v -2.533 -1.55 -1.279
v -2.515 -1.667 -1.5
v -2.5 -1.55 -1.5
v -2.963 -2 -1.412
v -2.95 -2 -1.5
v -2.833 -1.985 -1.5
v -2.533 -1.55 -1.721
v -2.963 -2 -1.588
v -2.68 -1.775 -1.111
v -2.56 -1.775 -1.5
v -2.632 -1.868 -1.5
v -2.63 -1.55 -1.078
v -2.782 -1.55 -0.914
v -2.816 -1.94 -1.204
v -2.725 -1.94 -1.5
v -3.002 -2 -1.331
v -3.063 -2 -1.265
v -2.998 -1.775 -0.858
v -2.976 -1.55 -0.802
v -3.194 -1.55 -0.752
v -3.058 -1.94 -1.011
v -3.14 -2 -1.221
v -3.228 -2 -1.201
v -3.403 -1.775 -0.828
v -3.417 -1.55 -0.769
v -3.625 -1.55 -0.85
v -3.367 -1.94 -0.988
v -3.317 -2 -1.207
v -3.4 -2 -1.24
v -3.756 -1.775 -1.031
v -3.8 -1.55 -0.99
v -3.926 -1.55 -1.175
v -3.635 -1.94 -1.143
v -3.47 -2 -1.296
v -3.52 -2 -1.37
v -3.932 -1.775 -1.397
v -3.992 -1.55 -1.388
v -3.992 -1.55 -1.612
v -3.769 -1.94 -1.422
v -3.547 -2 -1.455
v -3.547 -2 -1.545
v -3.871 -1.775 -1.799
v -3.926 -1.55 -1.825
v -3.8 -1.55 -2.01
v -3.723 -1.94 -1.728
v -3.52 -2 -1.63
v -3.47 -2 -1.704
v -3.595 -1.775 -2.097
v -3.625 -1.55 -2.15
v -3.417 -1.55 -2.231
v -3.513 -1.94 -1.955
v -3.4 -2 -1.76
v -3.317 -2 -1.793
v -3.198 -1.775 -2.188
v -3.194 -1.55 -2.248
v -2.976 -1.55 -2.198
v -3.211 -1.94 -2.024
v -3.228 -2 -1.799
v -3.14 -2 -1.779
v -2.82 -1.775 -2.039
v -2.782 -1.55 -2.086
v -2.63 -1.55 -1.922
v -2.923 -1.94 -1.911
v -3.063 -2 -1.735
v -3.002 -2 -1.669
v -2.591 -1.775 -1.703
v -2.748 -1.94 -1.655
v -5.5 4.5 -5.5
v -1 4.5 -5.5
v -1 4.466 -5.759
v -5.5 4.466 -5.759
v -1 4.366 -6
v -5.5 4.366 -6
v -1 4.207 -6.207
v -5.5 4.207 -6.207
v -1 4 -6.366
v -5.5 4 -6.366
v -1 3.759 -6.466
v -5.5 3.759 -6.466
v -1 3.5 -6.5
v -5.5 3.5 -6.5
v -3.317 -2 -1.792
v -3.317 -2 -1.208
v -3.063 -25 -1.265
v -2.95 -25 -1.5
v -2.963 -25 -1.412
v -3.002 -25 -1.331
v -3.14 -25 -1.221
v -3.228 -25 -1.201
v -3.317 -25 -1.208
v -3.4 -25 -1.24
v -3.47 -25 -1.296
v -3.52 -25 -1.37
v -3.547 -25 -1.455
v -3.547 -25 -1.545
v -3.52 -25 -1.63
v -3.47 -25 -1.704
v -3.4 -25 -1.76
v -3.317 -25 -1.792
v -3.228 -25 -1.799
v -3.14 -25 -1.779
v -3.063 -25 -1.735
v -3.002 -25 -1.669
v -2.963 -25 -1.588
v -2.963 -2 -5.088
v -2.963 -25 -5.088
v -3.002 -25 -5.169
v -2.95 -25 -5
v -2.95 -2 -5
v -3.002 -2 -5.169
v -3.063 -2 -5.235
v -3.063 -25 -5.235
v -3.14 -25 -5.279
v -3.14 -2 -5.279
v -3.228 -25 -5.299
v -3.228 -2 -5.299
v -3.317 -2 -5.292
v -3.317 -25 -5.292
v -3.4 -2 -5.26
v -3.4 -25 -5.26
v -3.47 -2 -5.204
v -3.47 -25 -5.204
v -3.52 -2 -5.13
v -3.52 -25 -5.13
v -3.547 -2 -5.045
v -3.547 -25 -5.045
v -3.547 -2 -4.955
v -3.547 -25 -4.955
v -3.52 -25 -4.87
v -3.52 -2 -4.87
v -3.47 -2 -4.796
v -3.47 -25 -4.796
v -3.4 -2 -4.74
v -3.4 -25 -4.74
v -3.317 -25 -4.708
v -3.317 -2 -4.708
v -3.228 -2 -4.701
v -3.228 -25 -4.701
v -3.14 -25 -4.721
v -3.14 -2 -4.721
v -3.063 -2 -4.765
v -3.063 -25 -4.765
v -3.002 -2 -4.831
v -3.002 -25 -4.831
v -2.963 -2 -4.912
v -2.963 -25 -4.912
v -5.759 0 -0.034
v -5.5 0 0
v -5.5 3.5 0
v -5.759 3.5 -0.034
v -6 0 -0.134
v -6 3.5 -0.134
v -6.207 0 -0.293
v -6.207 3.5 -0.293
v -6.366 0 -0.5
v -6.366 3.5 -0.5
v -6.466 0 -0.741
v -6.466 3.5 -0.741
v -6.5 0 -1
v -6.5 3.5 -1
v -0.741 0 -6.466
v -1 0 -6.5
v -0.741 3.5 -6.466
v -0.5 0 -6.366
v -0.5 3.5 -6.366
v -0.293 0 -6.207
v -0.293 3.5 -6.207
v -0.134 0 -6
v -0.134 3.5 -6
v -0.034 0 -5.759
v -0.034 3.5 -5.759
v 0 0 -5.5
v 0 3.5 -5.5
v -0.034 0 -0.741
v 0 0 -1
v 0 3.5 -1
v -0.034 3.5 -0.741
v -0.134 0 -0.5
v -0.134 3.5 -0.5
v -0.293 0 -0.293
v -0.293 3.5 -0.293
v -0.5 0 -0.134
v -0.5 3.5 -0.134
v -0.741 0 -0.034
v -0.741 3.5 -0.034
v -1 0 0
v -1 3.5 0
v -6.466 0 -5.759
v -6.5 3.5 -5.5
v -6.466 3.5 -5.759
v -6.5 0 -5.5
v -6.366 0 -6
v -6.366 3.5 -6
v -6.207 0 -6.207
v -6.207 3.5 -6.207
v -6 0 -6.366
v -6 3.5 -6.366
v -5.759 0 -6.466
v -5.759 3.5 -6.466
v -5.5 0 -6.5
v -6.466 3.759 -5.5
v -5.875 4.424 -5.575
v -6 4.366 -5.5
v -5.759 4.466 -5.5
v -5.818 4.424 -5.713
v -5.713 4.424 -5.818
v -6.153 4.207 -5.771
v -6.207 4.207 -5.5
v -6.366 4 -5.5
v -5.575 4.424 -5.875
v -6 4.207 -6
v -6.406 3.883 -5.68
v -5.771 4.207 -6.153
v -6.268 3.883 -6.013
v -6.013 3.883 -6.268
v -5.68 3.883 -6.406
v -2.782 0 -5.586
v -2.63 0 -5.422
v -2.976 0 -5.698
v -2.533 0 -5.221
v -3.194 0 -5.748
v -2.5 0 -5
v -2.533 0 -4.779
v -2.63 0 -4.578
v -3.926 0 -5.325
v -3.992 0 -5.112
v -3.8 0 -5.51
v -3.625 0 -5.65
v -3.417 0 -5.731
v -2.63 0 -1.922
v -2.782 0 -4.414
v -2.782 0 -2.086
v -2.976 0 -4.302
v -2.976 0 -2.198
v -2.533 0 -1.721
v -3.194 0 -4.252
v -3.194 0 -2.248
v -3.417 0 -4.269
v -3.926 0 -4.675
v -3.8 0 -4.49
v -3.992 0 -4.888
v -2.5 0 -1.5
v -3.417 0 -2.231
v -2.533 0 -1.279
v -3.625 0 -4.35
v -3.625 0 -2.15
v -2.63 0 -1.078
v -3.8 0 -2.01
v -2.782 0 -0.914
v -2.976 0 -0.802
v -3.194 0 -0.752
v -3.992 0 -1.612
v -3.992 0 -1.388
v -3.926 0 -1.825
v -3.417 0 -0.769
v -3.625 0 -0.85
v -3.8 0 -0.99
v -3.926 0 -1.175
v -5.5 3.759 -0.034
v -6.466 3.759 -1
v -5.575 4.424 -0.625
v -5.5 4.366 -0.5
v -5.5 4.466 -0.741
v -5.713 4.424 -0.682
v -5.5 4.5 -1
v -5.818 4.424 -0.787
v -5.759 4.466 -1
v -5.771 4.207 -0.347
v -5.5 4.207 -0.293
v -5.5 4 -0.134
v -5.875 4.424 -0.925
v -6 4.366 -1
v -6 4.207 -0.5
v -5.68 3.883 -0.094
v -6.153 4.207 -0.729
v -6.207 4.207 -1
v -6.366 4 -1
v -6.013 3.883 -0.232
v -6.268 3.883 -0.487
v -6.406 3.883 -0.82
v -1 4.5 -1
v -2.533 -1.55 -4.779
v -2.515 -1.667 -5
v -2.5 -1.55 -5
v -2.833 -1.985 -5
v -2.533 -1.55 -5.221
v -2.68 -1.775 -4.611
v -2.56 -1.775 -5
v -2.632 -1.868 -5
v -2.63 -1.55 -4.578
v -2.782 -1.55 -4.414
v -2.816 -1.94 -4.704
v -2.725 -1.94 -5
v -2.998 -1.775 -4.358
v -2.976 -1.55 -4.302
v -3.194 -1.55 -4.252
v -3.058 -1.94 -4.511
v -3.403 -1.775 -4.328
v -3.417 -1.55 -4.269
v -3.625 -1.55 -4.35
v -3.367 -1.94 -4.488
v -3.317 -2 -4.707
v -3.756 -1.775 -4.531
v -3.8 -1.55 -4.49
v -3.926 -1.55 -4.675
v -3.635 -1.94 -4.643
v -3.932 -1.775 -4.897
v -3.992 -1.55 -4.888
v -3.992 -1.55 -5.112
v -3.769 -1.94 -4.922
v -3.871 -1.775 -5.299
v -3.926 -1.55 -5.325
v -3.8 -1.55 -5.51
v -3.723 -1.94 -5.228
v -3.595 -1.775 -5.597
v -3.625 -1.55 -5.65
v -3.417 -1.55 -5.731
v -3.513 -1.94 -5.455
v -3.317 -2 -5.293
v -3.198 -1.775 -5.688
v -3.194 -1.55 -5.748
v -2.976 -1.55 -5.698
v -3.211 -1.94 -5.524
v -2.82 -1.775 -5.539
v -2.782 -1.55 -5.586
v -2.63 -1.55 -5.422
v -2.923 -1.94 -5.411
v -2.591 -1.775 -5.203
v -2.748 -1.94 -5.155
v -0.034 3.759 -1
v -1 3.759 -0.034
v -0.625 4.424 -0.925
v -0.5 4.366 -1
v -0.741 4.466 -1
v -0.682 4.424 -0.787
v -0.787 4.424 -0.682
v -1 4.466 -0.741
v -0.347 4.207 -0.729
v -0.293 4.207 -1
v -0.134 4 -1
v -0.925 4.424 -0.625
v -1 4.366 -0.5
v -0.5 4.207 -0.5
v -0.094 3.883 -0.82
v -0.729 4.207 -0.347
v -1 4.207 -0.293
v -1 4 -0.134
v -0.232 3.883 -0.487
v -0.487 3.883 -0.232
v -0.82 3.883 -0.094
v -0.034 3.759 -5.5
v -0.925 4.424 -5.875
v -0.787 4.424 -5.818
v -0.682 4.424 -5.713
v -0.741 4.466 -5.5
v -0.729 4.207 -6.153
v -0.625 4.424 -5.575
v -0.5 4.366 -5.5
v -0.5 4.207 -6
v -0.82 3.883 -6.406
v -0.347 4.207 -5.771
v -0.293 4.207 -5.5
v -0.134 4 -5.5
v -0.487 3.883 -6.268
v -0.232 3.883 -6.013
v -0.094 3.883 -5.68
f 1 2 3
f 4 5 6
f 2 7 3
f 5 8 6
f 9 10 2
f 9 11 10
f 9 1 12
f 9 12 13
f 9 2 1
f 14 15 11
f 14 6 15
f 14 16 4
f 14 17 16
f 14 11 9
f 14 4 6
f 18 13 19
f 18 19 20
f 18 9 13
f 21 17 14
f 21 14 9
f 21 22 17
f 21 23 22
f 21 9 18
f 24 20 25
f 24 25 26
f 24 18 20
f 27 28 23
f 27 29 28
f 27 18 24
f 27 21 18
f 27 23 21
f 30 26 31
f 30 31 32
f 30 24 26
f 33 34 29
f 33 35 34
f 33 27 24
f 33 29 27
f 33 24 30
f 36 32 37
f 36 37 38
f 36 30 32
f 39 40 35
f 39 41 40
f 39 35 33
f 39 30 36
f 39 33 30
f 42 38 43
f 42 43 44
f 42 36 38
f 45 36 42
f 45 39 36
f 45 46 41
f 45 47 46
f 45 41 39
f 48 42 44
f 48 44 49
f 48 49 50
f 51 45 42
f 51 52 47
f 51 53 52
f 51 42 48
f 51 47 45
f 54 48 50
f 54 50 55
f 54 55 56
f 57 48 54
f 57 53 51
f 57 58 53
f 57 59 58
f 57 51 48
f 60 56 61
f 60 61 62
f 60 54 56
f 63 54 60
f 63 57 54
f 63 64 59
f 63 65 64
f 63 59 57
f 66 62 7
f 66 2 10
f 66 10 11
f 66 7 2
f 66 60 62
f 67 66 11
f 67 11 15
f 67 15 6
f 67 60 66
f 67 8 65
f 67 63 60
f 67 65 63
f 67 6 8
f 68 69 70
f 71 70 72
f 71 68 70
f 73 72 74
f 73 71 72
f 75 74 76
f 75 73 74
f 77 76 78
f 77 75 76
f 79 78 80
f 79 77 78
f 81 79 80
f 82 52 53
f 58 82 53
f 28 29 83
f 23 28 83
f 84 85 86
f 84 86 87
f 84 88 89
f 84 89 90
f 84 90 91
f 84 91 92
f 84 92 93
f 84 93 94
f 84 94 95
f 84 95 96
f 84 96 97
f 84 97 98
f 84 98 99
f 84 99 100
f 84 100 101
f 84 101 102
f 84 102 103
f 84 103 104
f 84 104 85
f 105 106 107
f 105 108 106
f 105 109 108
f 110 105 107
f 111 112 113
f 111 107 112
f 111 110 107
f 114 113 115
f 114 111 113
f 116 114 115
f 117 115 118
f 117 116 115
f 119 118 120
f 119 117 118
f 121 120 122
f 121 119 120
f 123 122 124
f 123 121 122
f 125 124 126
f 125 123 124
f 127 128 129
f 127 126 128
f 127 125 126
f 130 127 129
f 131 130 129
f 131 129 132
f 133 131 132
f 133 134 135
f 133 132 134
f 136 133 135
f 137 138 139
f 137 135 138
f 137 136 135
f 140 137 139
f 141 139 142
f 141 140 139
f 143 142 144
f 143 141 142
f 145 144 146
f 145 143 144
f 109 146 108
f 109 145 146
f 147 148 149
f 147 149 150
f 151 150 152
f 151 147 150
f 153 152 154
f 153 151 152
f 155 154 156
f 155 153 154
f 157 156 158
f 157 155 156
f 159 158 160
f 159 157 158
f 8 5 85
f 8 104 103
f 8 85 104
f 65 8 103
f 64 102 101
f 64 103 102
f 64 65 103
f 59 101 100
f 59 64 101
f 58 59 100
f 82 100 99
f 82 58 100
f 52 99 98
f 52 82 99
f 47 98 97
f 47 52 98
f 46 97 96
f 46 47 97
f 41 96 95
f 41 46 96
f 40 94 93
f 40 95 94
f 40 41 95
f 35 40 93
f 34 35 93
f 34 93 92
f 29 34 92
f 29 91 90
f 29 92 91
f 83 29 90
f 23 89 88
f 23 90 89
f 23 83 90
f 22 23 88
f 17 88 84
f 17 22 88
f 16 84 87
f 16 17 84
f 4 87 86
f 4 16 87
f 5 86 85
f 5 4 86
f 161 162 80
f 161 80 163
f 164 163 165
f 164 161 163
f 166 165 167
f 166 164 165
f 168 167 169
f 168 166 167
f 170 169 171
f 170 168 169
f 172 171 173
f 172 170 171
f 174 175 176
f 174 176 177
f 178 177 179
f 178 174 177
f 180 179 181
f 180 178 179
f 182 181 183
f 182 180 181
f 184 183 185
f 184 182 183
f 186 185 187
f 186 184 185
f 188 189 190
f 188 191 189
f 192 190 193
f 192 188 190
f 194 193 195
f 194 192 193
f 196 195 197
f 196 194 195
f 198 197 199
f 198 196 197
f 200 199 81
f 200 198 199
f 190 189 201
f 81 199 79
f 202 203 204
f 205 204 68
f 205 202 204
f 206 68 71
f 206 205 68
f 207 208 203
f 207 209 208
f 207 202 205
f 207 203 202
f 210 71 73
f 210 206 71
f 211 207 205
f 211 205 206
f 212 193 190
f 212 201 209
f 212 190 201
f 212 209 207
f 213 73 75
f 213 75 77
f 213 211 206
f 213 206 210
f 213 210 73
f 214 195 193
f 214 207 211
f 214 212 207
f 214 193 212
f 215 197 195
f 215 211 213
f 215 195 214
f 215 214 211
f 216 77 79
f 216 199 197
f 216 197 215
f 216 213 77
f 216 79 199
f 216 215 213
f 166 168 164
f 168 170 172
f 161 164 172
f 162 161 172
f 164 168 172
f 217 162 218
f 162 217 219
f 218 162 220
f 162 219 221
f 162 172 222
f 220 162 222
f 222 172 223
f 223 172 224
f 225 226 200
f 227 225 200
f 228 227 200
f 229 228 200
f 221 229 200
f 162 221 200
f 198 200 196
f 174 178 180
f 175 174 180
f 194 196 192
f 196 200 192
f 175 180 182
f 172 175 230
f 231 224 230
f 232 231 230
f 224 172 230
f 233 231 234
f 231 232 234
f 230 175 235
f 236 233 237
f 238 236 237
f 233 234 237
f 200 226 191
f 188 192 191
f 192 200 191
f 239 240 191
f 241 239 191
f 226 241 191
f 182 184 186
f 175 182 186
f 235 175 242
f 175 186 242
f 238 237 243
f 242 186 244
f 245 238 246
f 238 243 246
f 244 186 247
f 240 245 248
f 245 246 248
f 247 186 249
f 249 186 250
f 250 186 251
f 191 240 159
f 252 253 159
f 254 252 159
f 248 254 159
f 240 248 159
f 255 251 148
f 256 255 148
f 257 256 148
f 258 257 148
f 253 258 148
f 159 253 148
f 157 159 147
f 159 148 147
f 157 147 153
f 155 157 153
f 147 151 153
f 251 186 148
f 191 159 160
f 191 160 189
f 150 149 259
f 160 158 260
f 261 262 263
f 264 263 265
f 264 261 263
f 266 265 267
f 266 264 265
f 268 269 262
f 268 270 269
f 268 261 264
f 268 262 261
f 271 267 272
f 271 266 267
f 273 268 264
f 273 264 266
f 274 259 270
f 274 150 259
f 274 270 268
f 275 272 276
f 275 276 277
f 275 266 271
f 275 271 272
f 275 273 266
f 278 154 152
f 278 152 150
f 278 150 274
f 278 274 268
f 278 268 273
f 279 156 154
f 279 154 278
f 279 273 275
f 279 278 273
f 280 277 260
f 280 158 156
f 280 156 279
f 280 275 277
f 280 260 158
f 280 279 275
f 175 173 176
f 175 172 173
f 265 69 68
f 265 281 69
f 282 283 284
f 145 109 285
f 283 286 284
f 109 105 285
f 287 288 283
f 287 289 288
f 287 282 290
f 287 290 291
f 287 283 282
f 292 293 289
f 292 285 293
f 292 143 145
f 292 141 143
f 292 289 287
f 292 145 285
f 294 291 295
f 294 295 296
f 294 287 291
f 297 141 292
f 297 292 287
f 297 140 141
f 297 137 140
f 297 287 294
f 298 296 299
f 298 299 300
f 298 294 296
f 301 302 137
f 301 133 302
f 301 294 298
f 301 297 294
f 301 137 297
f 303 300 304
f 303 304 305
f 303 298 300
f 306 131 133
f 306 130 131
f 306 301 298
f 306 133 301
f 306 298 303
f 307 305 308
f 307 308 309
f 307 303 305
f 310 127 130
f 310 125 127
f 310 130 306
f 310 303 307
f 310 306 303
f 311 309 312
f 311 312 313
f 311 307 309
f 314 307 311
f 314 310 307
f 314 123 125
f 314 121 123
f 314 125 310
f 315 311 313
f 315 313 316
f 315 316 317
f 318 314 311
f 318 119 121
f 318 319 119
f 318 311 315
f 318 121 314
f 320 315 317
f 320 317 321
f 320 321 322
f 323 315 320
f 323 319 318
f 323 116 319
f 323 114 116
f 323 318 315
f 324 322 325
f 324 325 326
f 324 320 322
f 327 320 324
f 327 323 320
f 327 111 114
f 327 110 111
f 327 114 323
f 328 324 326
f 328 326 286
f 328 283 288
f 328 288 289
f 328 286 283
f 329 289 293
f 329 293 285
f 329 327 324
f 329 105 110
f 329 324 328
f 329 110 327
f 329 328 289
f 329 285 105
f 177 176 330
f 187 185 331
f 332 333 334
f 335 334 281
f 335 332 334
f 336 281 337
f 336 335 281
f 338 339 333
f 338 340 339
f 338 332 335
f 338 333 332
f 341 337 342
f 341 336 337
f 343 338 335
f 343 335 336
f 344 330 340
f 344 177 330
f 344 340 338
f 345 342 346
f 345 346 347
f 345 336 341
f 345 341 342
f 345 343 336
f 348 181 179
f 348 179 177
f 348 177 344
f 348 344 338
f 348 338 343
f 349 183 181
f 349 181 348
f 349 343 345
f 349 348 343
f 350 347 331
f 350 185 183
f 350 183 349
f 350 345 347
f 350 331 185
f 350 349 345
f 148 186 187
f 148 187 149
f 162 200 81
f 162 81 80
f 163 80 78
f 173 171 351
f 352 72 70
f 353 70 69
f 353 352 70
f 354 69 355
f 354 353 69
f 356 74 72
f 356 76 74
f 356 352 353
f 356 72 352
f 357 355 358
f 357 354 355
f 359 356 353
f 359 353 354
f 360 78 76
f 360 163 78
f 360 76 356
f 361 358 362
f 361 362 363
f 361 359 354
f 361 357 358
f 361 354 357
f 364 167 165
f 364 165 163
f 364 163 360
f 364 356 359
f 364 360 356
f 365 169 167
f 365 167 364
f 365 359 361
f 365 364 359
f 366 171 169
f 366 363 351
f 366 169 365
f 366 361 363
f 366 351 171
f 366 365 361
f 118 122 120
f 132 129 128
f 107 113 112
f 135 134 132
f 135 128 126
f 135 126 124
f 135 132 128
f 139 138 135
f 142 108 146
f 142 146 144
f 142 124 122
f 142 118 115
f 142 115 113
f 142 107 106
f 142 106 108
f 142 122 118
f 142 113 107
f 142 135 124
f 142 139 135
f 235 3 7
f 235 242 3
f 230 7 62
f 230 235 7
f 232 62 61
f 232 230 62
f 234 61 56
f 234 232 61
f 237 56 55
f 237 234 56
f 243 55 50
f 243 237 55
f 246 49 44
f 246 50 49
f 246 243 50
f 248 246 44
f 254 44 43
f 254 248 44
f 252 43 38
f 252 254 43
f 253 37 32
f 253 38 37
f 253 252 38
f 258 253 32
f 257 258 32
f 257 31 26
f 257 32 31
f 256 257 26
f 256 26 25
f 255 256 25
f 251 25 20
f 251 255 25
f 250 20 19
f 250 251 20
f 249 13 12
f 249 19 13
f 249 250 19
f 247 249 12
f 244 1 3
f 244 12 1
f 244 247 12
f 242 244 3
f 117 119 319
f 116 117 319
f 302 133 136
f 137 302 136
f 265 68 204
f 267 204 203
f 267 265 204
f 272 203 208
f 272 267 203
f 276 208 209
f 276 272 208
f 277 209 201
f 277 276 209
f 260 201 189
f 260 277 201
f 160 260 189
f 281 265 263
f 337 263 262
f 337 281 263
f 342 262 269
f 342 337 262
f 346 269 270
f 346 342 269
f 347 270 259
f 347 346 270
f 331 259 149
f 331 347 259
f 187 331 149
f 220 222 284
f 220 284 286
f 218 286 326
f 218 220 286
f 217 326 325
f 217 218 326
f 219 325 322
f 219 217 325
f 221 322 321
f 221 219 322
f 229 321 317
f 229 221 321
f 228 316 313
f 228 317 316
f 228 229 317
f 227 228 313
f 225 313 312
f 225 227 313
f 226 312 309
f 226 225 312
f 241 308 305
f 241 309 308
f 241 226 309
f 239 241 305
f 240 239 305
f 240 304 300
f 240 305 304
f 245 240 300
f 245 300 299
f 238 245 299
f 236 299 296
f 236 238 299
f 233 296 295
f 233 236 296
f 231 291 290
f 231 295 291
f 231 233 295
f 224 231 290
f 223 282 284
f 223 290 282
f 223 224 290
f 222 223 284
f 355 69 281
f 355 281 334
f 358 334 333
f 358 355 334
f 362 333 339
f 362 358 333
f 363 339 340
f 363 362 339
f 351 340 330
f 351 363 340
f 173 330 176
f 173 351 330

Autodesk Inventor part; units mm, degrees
ref_plane "YZ Plane" through (0, 0, 0) normal (1, 0, 0) x (0, 1, 0)
ref_plane "XZ Plane" through (0, 0, 0) normal (0, 1, 0) x (-1, 0, 0)
ref_plane "XY Plane" through (0, 0, 0) normal (0, 0, 1) x (1, 0, 0)
sketch "Sketch1" plane through (0, 0, 0) normal (0, 1, 0) x (-1, 0, 0)
  line L0 (1, 0) -> (5.5, 0)
  line L1 (6.5, -1) -> (6.5, -5.5)
  line L2 (5.5, -6.5) -> (1, -6.5)
  line L3 (0, -5.5) -> (0, -1)
  arc A0 (6.5, -1) -> (5.5, 0) centre (5.5, -1) ccw
  arc A1 (0, -5.5) -> (1, -6.5) centre (1, -5.5) ccw
  arc A2 (5.5, -6.5) -> (6.5, -5.5) centre (5.5, -5.5) ccw
  arc A3 (1, 0) -> (0, -1) centre (1, -1) ccw
  circle A4 centre (3.25, -5) radius 0.75
  circle A5 centre (3.25, -1.5) radius 0.75
  point P0 (0, 0)
  point P1 (6.5, -6.5)
  point P2 (6.5, 0)
  point P3 (0, -6.5)
  dimension "d0" = 6.5
  dimension "d1" = 6.5
  dimension "d2" = 1
  dimension "d5" = 1.5
  dimension "d7" = 1.5
extrude "Extrusion1" add sketch "Sketch1" along normal blind 4.5 contours L0 A0 L1 A2 L2 A1 L3 A3 | A4 | A5
fillet "Fillet1" radius 1 8 edges at (-0.2929, 4.5, -6.2071) (-3.25, 4.5, -6.5) (-6.2071, 4.5, -6.2071) (-6.5, 4.5, -3.25) (-6.2071, 4.5, -0.2929) (-3.25, 4.5, 0) (-0.2929, 4.5, -0.2929) (0, 4.5, -3.25)
sketch "Sketch2" plane through (0, 0, 0) normal (0, -1, 0) x (1, 0, 0)
  circle A0 centre (-3.25, -1.5) radius 0.75
  circle A1 centre (-3.25, -5) radius 0.75
  point P0 (0, 0)
  dimension "d13" = 1.5
  dimension "d14" = 1.5
extrude "Extrusion2" add sketch "Sketch2" along normal blind 2
sketch "Sketch3" plane through (-3.25, -2, -1.5) normal (0, -1, 0) x (1, 0, 0)
  circle A0 centre (0, 0) radius 0.3
  circle A1 centre (0, -3.5) radius 0.75 projected
  circle A2 centre (0, -3.5) radius 0.3
  point P0 (3.25, 1.5)
  dimension "d17" = 0.6
  dimension "d18" = 0.6
extrude "Extrusion3" add sketch "Sketch3" along normal blind 23 contours A0 | A2
fillet "Fillet2" radius 0.45 2 edges at (-4, -2, -1.5) (-4, -2, -5)
equation "\"BendRadius\" = Thickness"
equation "\"BendReliefWidth\" = Thickness"
equation "\"BendReliefDepth\" = 0.5 * Thickness"
equation "\"CornerReliefSize\" = 4 * Thickness"
equation "\"MinimumRemnant\" = 2 * Thickness"
equation "\"TransitionRadius\" = BendRadius"
equation "\"JacobiRadiusSize\" = BendRadius"
equation "\"GapSize\" = Thickness"
equation "\"Thickness\" = 3.048"
